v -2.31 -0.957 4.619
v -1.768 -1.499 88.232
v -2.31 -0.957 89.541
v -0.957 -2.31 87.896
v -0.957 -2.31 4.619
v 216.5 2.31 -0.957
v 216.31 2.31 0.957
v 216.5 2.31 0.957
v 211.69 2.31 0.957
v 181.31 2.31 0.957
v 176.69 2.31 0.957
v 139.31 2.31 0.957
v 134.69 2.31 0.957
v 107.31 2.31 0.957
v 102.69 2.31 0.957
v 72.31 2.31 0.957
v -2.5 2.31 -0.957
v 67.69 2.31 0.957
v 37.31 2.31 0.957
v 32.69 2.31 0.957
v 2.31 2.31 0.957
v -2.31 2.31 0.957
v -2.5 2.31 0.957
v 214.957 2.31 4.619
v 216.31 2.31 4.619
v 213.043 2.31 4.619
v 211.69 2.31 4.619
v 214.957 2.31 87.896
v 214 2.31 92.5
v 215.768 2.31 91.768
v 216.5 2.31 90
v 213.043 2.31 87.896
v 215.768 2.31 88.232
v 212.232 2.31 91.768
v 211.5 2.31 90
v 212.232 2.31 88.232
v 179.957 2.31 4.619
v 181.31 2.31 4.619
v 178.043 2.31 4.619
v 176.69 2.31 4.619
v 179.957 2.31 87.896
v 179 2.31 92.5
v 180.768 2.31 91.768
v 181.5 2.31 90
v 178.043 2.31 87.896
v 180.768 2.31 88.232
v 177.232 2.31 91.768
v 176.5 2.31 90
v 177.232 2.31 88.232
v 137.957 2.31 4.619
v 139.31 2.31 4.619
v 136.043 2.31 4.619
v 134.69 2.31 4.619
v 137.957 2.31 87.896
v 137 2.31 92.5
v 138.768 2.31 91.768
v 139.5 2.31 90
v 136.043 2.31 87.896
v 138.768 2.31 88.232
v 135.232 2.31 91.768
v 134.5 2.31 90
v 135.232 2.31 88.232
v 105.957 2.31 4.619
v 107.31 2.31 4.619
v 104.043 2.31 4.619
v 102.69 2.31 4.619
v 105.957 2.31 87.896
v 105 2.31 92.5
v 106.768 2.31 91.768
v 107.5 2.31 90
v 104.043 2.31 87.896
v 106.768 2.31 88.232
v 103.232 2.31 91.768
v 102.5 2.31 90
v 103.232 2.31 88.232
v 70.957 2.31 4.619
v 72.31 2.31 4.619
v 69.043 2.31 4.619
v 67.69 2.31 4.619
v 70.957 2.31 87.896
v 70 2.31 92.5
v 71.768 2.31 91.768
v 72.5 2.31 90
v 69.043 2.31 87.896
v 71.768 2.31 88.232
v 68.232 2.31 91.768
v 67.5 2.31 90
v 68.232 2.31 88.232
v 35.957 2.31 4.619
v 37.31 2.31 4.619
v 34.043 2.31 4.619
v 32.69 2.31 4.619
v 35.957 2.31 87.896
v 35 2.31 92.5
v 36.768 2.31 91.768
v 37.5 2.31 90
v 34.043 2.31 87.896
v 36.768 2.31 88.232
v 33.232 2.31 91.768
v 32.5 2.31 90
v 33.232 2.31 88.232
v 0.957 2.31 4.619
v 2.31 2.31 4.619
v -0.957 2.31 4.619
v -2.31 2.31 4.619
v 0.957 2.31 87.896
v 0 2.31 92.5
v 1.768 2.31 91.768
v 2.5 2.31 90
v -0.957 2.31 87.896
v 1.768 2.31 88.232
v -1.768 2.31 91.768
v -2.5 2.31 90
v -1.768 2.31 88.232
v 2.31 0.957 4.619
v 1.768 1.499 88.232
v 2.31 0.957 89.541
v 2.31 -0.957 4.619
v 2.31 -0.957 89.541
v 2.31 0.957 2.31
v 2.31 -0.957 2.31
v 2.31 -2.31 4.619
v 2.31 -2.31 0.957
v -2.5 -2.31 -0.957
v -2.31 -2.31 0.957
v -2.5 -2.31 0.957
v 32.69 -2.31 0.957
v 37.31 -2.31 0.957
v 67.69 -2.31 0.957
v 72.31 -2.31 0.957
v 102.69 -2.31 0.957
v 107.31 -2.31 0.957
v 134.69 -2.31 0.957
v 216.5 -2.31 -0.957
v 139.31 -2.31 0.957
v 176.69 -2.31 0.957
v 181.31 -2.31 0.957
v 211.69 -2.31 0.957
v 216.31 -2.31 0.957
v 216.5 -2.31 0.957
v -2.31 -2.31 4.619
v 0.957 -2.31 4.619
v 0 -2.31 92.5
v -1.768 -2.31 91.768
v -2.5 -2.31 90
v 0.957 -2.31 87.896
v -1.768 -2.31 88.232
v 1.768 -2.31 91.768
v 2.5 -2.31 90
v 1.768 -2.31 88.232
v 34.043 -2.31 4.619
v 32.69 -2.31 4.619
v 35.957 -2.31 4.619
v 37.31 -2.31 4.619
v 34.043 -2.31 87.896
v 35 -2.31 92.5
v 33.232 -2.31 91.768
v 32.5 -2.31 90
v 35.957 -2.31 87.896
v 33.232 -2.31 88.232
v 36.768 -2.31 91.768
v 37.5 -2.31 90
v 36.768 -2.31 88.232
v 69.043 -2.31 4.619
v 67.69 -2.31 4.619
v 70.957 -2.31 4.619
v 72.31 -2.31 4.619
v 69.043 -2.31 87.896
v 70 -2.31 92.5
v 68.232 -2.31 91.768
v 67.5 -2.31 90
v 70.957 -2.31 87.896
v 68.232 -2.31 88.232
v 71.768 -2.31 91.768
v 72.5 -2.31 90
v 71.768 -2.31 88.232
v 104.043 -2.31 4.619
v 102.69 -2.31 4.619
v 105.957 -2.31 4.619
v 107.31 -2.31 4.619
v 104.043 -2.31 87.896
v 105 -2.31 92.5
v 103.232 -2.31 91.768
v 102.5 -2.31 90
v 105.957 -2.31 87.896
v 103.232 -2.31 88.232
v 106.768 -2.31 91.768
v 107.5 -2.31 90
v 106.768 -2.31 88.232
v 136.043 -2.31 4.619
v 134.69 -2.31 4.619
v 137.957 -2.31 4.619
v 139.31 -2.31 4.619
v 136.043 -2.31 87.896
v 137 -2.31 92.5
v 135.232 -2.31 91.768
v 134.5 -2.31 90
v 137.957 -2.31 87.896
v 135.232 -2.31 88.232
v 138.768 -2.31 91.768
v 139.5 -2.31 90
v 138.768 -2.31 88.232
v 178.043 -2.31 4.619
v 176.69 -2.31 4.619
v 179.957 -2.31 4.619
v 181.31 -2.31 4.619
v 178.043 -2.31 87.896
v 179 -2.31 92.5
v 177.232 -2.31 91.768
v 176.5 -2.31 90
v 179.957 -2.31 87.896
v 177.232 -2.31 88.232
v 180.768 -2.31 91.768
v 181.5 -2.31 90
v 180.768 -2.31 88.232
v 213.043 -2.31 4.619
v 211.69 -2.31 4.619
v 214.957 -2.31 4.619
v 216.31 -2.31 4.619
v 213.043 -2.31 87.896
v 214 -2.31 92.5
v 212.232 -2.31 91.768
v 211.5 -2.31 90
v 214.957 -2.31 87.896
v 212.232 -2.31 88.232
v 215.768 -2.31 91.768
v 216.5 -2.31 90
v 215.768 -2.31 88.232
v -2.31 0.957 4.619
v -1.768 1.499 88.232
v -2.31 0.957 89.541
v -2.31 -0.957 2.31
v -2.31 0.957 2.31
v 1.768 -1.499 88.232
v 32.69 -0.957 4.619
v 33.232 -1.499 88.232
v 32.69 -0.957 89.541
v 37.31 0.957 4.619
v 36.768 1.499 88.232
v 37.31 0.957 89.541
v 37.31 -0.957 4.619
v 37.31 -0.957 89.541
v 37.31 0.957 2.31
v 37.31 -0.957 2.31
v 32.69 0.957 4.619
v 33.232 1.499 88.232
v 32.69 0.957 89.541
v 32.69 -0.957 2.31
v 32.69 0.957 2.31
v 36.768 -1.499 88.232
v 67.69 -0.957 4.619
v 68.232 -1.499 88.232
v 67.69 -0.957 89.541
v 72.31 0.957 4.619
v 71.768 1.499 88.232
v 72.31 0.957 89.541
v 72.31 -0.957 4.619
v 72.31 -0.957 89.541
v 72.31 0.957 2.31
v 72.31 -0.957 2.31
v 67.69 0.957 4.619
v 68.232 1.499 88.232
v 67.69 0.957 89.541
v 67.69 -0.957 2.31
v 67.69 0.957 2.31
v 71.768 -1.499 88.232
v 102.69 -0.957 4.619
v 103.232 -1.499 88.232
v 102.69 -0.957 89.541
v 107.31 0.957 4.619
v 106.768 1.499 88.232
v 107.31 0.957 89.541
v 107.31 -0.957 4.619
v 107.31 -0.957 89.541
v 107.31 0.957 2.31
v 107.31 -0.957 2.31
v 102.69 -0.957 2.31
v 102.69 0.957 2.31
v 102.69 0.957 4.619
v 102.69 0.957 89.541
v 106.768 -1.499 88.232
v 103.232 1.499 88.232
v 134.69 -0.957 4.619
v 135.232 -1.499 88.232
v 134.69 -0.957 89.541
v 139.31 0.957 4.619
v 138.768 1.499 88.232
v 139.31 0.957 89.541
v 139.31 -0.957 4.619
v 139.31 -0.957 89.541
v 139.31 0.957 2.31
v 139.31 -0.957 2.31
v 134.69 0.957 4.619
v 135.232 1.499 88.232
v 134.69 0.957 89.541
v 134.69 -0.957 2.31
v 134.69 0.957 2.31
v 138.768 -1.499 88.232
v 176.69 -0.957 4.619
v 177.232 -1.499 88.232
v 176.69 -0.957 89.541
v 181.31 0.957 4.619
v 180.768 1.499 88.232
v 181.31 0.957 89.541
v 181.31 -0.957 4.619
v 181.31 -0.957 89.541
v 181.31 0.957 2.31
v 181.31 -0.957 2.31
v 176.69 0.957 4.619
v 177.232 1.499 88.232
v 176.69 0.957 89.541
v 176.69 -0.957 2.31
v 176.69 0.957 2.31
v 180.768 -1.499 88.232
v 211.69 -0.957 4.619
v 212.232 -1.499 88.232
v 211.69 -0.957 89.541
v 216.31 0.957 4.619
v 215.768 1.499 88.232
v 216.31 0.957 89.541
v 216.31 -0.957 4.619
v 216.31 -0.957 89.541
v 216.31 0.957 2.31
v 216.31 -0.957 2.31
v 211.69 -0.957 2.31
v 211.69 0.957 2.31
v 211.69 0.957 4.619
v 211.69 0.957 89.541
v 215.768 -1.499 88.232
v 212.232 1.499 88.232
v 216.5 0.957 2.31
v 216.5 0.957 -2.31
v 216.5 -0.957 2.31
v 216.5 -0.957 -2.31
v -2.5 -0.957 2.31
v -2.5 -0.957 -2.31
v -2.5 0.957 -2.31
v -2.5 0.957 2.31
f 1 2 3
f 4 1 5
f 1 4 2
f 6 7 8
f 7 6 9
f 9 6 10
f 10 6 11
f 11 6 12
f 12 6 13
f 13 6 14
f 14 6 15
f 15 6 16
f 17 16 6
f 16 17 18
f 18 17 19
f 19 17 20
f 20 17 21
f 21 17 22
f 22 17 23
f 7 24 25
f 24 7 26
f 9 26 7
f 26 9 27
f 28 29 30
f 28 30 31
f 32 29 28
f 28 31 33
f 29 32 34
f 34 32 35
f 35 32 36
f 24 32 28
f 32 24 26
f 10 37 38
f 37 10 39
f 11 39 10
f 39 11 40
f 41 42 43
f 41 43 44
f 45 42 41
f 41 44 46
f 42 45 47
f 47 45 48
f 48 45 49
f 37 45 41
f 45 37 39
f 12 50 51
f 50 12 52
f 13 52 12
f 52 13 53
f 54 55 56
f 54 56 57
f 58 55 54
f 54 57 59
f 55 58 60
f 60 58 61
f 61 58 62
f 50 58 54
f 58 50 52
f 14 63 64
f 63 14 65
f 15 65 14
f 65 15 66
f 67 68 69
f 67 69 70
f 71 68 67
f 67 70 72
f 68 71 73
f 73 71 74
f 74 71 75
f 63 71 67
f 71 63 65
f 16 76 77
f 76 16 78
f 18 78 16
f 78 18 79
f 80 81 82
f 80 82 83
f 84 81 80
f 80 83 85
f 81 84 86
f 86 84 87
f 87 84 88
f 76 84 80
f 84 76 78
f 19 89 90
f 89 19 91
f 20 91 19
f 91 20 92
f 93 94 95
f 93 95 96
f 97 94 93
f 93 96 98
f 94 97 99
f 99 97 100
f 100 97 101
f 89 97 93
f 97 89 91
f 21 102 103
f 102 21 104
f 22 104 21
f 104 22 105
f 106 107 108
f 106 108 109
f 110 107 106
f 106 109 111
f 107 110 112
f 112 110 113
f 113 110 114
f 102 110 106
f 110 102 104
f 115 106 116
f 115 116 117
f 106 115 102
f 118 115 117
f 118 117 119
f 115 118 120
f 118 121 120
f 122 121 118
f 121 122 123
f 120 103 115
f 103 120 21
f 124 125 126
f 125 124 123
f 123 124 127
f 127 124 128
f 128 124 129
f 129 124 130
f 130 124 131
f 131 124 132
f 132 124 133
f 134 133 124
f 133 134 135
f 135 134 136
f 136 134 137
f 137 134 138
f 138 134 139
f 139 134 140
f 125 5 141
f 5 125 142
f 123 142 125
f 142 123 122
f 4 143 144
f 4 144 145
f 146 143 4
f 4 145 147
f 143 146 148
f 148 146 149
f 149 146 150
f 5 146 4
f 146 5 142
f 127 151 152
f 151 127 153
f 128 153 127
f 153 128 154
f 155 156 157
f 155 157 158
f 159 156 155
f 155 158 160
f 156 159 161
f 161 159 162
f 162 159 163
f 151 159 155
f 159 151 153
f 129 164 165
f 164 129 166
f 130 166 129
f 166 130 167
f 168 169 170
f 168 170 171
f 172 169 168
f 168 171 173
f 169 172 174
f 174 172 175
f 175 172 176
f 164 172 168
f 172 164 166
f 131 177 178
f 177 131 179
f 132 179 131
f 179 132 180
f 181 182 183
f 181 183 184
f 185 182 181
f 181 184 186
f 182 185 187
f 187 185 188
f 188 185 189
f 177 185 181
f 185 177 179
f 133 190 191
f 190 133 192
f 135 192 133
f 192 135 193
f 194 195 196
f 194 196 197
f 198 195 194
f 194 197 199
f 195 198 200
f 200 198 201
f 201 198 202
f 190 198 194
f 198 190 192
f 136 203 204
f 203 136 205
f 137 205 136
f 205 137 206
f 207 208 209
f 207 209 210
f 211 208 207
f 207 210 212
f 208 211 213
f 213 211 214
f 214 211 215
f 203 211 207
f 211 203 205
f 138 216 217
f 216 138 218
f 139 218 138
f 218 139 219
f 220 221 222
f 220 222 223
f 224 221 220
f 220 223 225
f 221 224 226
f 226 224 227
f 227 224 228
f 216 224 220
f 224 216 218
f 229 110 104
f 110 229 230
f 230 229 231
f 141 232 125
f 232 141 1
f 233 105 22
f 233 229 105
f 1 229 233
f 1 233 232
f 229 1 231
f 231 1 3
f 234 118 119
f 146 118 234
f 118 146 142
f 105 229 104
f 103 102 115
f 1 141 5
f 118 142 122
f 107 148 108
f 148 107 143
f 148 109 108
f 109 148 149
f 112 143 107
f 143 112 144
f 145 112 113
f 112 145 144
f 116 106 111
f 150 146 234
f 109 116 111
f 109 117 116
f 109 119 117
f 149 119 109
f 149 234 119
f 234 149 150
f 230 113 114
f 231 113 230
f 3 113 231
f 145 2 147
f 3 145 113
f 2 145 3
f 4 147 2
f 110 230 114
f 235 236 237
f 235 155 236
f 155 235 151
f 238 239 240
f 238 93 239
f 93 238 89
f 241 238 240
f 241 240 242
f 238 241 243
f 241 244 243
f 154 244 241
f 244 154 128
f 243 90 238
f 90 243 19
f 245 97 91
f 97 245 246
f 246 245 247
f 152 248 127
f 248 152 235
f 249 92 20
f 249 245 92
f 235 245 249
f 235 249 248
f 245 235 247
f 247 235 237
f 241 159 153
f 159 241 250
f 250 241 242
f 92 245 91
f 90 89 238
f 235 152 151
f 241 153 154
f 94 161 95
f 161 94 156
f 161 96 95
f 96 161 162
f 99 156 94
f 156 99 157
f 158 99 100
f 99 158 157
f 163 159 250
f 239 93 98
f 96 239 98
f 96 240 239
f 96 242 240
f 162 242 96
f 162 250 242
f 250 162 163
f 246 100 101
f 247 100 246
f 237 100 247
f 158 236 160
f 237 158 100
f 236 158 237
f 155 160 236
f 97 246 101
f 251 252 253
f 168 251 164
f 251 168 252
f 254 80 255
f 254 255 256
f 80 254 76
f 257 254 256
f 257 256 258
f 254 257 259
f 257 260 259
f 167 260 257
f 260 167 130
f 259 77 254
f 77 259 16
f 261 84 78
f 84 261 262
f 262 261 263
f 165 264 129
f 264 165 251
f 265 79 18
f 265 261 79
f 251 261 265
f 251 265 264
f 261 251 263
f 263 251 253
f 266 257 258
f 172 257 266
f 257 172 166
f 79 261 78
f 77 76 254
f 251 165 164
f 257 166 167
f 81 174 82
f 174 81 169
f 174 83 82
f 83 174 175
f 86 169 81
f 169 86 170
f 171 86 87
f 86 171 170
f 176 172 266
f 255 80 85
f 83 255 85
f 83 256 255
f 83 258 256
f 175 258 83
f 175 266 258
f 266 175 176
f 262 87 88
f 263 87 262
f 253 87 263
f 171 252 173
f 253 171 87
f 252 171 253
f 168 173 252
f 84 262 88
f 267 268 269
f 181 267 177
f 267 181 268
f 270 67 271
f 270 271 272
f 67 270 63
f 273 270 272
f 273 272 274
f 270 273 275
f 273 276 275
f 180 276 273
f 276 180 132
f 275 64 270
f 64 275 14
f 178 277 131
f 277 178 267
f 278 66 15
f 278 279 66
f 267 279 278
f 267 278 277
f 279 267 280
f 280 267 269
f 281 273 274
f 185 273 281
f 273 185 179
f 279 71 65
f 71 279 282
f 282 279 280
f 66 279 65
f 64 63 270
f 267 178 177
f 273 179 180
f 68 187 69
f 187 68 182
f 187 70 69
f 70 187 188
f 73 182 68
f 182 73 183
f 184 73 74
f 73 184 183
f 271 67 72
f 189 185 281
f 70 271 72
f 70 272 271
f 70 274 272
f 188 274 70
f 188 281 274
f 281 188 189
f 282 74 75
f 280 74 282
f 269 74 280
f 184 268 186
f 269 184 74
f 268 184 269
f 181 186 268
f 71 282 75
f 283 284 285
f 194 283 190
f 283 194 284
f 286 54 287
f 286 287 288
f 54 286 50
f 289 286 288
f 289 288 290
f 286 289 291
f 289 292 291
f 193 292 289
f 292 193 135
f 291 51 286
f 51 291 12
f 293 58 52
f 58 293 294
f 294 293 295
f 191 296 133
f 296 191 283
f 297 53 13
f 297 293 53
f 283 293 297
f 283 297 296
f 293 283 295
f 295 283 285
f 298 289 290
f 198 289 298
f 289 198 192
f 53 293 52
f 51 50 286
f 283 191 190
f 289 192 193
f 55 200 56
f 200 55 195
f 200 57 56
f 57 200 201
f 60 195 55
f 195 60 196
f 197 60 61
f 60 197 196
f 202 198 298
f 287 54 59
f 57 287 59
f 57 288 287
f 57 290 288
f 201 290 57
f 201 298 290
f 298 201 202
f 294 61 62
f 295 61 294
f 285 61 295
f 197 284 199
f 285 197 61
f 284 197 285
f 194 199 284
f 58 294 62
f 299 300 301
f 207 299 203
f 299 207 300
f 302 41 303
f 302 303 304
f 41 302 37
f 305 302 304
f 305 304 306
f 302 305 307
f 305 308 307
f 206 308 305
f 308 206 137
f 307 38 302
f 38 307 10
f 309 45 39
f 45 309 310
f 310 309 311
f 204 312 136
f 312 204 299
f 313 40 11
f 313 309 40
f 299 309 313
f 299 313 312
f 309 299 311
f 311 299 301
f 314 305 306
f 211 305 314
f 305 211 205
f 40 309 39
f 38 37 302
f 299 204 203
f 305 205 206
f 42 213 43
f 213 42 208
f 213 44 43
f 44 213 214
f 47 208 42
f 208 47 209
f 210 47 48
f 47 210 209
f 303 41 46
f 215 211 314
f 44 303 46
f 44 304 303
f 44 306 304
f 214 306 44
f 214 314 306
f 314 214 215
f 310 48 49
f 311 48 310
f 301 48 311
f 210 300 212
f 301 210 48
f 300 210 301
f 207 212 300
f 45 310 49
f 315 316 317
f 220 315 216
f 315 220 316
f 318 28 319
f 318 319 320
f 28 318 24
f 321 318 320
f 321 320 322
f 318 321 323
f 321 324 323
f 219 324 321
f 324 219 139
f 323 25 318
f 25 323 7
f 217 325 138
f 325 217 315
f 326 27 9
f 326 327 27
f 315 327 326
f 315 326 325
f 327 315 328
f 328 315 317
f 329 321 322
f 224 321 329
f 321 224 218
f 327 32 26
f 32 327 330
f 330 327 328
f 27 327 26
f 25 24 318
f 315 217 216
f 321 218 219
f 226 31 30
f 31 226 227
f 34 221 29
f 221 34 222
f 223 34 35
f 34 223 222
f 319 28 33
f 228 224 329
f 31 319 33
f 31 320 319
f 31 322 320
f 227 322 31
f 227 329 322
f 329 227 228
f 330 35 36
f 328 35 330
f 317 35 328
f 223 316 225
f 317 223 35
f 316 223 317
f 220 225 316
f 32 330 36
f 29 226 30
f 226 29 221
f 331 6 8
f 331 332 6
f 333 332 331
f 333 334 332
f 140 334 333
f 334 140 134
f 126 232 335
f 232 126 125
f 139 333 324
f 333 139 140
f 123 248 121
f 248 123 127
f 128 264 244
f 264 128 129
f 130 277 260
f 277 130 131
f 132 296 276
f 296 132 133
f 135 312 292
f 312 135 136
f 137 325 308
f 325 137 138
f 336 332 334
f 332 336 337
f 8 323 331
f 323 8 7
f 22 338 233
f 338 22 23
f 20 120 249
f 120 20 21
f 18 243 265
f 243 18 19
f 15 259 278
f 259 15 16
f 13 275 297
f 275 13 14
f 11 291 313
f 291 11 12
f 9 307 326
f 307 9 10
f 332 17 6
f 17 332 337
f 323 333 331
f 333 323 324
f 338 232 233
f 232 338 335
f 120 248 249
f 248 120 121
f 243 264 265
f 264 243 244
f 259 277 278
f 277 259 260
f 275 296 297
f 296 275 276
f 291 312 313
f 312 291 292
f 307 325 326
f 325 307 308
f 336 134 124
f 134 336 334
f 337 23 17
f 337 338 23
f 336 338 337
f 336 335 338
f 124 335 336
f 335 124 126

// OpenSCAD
// dishwasher thingie

height=90;
radius=2.5;
gap = 35;
narrow = 32;
wide = 42;

angle=22.5;
echo(cos(angle));

cr = cos(angle)*radius;	// 'inside radius' of octagon

$fn=8;	// make them octogons so easily printable

px=[0,gap,2*gap,3*gap,3*gap+narrow,3*gap+narrow+wide,4*gap+narrow+wide];

for (x=px) {
	translate([x,0,0]) {
		rotate([0,0,22.5]) cylinder(h=height,r=radius);
		translate([-cr,-cr,0]) 
			cube([2*cr,2*cr,2*cr]);
		translate([0,cr,height]) rotate([90,0,0]) cylinder(r=radius,h=2*cr);
		}
	}

rotate([0,90,0]) translate([0,0,-radius]) rotate([0,0,22.5]) cylinder(h=4*gap+narrow+wide+2*radius, r=radius);
